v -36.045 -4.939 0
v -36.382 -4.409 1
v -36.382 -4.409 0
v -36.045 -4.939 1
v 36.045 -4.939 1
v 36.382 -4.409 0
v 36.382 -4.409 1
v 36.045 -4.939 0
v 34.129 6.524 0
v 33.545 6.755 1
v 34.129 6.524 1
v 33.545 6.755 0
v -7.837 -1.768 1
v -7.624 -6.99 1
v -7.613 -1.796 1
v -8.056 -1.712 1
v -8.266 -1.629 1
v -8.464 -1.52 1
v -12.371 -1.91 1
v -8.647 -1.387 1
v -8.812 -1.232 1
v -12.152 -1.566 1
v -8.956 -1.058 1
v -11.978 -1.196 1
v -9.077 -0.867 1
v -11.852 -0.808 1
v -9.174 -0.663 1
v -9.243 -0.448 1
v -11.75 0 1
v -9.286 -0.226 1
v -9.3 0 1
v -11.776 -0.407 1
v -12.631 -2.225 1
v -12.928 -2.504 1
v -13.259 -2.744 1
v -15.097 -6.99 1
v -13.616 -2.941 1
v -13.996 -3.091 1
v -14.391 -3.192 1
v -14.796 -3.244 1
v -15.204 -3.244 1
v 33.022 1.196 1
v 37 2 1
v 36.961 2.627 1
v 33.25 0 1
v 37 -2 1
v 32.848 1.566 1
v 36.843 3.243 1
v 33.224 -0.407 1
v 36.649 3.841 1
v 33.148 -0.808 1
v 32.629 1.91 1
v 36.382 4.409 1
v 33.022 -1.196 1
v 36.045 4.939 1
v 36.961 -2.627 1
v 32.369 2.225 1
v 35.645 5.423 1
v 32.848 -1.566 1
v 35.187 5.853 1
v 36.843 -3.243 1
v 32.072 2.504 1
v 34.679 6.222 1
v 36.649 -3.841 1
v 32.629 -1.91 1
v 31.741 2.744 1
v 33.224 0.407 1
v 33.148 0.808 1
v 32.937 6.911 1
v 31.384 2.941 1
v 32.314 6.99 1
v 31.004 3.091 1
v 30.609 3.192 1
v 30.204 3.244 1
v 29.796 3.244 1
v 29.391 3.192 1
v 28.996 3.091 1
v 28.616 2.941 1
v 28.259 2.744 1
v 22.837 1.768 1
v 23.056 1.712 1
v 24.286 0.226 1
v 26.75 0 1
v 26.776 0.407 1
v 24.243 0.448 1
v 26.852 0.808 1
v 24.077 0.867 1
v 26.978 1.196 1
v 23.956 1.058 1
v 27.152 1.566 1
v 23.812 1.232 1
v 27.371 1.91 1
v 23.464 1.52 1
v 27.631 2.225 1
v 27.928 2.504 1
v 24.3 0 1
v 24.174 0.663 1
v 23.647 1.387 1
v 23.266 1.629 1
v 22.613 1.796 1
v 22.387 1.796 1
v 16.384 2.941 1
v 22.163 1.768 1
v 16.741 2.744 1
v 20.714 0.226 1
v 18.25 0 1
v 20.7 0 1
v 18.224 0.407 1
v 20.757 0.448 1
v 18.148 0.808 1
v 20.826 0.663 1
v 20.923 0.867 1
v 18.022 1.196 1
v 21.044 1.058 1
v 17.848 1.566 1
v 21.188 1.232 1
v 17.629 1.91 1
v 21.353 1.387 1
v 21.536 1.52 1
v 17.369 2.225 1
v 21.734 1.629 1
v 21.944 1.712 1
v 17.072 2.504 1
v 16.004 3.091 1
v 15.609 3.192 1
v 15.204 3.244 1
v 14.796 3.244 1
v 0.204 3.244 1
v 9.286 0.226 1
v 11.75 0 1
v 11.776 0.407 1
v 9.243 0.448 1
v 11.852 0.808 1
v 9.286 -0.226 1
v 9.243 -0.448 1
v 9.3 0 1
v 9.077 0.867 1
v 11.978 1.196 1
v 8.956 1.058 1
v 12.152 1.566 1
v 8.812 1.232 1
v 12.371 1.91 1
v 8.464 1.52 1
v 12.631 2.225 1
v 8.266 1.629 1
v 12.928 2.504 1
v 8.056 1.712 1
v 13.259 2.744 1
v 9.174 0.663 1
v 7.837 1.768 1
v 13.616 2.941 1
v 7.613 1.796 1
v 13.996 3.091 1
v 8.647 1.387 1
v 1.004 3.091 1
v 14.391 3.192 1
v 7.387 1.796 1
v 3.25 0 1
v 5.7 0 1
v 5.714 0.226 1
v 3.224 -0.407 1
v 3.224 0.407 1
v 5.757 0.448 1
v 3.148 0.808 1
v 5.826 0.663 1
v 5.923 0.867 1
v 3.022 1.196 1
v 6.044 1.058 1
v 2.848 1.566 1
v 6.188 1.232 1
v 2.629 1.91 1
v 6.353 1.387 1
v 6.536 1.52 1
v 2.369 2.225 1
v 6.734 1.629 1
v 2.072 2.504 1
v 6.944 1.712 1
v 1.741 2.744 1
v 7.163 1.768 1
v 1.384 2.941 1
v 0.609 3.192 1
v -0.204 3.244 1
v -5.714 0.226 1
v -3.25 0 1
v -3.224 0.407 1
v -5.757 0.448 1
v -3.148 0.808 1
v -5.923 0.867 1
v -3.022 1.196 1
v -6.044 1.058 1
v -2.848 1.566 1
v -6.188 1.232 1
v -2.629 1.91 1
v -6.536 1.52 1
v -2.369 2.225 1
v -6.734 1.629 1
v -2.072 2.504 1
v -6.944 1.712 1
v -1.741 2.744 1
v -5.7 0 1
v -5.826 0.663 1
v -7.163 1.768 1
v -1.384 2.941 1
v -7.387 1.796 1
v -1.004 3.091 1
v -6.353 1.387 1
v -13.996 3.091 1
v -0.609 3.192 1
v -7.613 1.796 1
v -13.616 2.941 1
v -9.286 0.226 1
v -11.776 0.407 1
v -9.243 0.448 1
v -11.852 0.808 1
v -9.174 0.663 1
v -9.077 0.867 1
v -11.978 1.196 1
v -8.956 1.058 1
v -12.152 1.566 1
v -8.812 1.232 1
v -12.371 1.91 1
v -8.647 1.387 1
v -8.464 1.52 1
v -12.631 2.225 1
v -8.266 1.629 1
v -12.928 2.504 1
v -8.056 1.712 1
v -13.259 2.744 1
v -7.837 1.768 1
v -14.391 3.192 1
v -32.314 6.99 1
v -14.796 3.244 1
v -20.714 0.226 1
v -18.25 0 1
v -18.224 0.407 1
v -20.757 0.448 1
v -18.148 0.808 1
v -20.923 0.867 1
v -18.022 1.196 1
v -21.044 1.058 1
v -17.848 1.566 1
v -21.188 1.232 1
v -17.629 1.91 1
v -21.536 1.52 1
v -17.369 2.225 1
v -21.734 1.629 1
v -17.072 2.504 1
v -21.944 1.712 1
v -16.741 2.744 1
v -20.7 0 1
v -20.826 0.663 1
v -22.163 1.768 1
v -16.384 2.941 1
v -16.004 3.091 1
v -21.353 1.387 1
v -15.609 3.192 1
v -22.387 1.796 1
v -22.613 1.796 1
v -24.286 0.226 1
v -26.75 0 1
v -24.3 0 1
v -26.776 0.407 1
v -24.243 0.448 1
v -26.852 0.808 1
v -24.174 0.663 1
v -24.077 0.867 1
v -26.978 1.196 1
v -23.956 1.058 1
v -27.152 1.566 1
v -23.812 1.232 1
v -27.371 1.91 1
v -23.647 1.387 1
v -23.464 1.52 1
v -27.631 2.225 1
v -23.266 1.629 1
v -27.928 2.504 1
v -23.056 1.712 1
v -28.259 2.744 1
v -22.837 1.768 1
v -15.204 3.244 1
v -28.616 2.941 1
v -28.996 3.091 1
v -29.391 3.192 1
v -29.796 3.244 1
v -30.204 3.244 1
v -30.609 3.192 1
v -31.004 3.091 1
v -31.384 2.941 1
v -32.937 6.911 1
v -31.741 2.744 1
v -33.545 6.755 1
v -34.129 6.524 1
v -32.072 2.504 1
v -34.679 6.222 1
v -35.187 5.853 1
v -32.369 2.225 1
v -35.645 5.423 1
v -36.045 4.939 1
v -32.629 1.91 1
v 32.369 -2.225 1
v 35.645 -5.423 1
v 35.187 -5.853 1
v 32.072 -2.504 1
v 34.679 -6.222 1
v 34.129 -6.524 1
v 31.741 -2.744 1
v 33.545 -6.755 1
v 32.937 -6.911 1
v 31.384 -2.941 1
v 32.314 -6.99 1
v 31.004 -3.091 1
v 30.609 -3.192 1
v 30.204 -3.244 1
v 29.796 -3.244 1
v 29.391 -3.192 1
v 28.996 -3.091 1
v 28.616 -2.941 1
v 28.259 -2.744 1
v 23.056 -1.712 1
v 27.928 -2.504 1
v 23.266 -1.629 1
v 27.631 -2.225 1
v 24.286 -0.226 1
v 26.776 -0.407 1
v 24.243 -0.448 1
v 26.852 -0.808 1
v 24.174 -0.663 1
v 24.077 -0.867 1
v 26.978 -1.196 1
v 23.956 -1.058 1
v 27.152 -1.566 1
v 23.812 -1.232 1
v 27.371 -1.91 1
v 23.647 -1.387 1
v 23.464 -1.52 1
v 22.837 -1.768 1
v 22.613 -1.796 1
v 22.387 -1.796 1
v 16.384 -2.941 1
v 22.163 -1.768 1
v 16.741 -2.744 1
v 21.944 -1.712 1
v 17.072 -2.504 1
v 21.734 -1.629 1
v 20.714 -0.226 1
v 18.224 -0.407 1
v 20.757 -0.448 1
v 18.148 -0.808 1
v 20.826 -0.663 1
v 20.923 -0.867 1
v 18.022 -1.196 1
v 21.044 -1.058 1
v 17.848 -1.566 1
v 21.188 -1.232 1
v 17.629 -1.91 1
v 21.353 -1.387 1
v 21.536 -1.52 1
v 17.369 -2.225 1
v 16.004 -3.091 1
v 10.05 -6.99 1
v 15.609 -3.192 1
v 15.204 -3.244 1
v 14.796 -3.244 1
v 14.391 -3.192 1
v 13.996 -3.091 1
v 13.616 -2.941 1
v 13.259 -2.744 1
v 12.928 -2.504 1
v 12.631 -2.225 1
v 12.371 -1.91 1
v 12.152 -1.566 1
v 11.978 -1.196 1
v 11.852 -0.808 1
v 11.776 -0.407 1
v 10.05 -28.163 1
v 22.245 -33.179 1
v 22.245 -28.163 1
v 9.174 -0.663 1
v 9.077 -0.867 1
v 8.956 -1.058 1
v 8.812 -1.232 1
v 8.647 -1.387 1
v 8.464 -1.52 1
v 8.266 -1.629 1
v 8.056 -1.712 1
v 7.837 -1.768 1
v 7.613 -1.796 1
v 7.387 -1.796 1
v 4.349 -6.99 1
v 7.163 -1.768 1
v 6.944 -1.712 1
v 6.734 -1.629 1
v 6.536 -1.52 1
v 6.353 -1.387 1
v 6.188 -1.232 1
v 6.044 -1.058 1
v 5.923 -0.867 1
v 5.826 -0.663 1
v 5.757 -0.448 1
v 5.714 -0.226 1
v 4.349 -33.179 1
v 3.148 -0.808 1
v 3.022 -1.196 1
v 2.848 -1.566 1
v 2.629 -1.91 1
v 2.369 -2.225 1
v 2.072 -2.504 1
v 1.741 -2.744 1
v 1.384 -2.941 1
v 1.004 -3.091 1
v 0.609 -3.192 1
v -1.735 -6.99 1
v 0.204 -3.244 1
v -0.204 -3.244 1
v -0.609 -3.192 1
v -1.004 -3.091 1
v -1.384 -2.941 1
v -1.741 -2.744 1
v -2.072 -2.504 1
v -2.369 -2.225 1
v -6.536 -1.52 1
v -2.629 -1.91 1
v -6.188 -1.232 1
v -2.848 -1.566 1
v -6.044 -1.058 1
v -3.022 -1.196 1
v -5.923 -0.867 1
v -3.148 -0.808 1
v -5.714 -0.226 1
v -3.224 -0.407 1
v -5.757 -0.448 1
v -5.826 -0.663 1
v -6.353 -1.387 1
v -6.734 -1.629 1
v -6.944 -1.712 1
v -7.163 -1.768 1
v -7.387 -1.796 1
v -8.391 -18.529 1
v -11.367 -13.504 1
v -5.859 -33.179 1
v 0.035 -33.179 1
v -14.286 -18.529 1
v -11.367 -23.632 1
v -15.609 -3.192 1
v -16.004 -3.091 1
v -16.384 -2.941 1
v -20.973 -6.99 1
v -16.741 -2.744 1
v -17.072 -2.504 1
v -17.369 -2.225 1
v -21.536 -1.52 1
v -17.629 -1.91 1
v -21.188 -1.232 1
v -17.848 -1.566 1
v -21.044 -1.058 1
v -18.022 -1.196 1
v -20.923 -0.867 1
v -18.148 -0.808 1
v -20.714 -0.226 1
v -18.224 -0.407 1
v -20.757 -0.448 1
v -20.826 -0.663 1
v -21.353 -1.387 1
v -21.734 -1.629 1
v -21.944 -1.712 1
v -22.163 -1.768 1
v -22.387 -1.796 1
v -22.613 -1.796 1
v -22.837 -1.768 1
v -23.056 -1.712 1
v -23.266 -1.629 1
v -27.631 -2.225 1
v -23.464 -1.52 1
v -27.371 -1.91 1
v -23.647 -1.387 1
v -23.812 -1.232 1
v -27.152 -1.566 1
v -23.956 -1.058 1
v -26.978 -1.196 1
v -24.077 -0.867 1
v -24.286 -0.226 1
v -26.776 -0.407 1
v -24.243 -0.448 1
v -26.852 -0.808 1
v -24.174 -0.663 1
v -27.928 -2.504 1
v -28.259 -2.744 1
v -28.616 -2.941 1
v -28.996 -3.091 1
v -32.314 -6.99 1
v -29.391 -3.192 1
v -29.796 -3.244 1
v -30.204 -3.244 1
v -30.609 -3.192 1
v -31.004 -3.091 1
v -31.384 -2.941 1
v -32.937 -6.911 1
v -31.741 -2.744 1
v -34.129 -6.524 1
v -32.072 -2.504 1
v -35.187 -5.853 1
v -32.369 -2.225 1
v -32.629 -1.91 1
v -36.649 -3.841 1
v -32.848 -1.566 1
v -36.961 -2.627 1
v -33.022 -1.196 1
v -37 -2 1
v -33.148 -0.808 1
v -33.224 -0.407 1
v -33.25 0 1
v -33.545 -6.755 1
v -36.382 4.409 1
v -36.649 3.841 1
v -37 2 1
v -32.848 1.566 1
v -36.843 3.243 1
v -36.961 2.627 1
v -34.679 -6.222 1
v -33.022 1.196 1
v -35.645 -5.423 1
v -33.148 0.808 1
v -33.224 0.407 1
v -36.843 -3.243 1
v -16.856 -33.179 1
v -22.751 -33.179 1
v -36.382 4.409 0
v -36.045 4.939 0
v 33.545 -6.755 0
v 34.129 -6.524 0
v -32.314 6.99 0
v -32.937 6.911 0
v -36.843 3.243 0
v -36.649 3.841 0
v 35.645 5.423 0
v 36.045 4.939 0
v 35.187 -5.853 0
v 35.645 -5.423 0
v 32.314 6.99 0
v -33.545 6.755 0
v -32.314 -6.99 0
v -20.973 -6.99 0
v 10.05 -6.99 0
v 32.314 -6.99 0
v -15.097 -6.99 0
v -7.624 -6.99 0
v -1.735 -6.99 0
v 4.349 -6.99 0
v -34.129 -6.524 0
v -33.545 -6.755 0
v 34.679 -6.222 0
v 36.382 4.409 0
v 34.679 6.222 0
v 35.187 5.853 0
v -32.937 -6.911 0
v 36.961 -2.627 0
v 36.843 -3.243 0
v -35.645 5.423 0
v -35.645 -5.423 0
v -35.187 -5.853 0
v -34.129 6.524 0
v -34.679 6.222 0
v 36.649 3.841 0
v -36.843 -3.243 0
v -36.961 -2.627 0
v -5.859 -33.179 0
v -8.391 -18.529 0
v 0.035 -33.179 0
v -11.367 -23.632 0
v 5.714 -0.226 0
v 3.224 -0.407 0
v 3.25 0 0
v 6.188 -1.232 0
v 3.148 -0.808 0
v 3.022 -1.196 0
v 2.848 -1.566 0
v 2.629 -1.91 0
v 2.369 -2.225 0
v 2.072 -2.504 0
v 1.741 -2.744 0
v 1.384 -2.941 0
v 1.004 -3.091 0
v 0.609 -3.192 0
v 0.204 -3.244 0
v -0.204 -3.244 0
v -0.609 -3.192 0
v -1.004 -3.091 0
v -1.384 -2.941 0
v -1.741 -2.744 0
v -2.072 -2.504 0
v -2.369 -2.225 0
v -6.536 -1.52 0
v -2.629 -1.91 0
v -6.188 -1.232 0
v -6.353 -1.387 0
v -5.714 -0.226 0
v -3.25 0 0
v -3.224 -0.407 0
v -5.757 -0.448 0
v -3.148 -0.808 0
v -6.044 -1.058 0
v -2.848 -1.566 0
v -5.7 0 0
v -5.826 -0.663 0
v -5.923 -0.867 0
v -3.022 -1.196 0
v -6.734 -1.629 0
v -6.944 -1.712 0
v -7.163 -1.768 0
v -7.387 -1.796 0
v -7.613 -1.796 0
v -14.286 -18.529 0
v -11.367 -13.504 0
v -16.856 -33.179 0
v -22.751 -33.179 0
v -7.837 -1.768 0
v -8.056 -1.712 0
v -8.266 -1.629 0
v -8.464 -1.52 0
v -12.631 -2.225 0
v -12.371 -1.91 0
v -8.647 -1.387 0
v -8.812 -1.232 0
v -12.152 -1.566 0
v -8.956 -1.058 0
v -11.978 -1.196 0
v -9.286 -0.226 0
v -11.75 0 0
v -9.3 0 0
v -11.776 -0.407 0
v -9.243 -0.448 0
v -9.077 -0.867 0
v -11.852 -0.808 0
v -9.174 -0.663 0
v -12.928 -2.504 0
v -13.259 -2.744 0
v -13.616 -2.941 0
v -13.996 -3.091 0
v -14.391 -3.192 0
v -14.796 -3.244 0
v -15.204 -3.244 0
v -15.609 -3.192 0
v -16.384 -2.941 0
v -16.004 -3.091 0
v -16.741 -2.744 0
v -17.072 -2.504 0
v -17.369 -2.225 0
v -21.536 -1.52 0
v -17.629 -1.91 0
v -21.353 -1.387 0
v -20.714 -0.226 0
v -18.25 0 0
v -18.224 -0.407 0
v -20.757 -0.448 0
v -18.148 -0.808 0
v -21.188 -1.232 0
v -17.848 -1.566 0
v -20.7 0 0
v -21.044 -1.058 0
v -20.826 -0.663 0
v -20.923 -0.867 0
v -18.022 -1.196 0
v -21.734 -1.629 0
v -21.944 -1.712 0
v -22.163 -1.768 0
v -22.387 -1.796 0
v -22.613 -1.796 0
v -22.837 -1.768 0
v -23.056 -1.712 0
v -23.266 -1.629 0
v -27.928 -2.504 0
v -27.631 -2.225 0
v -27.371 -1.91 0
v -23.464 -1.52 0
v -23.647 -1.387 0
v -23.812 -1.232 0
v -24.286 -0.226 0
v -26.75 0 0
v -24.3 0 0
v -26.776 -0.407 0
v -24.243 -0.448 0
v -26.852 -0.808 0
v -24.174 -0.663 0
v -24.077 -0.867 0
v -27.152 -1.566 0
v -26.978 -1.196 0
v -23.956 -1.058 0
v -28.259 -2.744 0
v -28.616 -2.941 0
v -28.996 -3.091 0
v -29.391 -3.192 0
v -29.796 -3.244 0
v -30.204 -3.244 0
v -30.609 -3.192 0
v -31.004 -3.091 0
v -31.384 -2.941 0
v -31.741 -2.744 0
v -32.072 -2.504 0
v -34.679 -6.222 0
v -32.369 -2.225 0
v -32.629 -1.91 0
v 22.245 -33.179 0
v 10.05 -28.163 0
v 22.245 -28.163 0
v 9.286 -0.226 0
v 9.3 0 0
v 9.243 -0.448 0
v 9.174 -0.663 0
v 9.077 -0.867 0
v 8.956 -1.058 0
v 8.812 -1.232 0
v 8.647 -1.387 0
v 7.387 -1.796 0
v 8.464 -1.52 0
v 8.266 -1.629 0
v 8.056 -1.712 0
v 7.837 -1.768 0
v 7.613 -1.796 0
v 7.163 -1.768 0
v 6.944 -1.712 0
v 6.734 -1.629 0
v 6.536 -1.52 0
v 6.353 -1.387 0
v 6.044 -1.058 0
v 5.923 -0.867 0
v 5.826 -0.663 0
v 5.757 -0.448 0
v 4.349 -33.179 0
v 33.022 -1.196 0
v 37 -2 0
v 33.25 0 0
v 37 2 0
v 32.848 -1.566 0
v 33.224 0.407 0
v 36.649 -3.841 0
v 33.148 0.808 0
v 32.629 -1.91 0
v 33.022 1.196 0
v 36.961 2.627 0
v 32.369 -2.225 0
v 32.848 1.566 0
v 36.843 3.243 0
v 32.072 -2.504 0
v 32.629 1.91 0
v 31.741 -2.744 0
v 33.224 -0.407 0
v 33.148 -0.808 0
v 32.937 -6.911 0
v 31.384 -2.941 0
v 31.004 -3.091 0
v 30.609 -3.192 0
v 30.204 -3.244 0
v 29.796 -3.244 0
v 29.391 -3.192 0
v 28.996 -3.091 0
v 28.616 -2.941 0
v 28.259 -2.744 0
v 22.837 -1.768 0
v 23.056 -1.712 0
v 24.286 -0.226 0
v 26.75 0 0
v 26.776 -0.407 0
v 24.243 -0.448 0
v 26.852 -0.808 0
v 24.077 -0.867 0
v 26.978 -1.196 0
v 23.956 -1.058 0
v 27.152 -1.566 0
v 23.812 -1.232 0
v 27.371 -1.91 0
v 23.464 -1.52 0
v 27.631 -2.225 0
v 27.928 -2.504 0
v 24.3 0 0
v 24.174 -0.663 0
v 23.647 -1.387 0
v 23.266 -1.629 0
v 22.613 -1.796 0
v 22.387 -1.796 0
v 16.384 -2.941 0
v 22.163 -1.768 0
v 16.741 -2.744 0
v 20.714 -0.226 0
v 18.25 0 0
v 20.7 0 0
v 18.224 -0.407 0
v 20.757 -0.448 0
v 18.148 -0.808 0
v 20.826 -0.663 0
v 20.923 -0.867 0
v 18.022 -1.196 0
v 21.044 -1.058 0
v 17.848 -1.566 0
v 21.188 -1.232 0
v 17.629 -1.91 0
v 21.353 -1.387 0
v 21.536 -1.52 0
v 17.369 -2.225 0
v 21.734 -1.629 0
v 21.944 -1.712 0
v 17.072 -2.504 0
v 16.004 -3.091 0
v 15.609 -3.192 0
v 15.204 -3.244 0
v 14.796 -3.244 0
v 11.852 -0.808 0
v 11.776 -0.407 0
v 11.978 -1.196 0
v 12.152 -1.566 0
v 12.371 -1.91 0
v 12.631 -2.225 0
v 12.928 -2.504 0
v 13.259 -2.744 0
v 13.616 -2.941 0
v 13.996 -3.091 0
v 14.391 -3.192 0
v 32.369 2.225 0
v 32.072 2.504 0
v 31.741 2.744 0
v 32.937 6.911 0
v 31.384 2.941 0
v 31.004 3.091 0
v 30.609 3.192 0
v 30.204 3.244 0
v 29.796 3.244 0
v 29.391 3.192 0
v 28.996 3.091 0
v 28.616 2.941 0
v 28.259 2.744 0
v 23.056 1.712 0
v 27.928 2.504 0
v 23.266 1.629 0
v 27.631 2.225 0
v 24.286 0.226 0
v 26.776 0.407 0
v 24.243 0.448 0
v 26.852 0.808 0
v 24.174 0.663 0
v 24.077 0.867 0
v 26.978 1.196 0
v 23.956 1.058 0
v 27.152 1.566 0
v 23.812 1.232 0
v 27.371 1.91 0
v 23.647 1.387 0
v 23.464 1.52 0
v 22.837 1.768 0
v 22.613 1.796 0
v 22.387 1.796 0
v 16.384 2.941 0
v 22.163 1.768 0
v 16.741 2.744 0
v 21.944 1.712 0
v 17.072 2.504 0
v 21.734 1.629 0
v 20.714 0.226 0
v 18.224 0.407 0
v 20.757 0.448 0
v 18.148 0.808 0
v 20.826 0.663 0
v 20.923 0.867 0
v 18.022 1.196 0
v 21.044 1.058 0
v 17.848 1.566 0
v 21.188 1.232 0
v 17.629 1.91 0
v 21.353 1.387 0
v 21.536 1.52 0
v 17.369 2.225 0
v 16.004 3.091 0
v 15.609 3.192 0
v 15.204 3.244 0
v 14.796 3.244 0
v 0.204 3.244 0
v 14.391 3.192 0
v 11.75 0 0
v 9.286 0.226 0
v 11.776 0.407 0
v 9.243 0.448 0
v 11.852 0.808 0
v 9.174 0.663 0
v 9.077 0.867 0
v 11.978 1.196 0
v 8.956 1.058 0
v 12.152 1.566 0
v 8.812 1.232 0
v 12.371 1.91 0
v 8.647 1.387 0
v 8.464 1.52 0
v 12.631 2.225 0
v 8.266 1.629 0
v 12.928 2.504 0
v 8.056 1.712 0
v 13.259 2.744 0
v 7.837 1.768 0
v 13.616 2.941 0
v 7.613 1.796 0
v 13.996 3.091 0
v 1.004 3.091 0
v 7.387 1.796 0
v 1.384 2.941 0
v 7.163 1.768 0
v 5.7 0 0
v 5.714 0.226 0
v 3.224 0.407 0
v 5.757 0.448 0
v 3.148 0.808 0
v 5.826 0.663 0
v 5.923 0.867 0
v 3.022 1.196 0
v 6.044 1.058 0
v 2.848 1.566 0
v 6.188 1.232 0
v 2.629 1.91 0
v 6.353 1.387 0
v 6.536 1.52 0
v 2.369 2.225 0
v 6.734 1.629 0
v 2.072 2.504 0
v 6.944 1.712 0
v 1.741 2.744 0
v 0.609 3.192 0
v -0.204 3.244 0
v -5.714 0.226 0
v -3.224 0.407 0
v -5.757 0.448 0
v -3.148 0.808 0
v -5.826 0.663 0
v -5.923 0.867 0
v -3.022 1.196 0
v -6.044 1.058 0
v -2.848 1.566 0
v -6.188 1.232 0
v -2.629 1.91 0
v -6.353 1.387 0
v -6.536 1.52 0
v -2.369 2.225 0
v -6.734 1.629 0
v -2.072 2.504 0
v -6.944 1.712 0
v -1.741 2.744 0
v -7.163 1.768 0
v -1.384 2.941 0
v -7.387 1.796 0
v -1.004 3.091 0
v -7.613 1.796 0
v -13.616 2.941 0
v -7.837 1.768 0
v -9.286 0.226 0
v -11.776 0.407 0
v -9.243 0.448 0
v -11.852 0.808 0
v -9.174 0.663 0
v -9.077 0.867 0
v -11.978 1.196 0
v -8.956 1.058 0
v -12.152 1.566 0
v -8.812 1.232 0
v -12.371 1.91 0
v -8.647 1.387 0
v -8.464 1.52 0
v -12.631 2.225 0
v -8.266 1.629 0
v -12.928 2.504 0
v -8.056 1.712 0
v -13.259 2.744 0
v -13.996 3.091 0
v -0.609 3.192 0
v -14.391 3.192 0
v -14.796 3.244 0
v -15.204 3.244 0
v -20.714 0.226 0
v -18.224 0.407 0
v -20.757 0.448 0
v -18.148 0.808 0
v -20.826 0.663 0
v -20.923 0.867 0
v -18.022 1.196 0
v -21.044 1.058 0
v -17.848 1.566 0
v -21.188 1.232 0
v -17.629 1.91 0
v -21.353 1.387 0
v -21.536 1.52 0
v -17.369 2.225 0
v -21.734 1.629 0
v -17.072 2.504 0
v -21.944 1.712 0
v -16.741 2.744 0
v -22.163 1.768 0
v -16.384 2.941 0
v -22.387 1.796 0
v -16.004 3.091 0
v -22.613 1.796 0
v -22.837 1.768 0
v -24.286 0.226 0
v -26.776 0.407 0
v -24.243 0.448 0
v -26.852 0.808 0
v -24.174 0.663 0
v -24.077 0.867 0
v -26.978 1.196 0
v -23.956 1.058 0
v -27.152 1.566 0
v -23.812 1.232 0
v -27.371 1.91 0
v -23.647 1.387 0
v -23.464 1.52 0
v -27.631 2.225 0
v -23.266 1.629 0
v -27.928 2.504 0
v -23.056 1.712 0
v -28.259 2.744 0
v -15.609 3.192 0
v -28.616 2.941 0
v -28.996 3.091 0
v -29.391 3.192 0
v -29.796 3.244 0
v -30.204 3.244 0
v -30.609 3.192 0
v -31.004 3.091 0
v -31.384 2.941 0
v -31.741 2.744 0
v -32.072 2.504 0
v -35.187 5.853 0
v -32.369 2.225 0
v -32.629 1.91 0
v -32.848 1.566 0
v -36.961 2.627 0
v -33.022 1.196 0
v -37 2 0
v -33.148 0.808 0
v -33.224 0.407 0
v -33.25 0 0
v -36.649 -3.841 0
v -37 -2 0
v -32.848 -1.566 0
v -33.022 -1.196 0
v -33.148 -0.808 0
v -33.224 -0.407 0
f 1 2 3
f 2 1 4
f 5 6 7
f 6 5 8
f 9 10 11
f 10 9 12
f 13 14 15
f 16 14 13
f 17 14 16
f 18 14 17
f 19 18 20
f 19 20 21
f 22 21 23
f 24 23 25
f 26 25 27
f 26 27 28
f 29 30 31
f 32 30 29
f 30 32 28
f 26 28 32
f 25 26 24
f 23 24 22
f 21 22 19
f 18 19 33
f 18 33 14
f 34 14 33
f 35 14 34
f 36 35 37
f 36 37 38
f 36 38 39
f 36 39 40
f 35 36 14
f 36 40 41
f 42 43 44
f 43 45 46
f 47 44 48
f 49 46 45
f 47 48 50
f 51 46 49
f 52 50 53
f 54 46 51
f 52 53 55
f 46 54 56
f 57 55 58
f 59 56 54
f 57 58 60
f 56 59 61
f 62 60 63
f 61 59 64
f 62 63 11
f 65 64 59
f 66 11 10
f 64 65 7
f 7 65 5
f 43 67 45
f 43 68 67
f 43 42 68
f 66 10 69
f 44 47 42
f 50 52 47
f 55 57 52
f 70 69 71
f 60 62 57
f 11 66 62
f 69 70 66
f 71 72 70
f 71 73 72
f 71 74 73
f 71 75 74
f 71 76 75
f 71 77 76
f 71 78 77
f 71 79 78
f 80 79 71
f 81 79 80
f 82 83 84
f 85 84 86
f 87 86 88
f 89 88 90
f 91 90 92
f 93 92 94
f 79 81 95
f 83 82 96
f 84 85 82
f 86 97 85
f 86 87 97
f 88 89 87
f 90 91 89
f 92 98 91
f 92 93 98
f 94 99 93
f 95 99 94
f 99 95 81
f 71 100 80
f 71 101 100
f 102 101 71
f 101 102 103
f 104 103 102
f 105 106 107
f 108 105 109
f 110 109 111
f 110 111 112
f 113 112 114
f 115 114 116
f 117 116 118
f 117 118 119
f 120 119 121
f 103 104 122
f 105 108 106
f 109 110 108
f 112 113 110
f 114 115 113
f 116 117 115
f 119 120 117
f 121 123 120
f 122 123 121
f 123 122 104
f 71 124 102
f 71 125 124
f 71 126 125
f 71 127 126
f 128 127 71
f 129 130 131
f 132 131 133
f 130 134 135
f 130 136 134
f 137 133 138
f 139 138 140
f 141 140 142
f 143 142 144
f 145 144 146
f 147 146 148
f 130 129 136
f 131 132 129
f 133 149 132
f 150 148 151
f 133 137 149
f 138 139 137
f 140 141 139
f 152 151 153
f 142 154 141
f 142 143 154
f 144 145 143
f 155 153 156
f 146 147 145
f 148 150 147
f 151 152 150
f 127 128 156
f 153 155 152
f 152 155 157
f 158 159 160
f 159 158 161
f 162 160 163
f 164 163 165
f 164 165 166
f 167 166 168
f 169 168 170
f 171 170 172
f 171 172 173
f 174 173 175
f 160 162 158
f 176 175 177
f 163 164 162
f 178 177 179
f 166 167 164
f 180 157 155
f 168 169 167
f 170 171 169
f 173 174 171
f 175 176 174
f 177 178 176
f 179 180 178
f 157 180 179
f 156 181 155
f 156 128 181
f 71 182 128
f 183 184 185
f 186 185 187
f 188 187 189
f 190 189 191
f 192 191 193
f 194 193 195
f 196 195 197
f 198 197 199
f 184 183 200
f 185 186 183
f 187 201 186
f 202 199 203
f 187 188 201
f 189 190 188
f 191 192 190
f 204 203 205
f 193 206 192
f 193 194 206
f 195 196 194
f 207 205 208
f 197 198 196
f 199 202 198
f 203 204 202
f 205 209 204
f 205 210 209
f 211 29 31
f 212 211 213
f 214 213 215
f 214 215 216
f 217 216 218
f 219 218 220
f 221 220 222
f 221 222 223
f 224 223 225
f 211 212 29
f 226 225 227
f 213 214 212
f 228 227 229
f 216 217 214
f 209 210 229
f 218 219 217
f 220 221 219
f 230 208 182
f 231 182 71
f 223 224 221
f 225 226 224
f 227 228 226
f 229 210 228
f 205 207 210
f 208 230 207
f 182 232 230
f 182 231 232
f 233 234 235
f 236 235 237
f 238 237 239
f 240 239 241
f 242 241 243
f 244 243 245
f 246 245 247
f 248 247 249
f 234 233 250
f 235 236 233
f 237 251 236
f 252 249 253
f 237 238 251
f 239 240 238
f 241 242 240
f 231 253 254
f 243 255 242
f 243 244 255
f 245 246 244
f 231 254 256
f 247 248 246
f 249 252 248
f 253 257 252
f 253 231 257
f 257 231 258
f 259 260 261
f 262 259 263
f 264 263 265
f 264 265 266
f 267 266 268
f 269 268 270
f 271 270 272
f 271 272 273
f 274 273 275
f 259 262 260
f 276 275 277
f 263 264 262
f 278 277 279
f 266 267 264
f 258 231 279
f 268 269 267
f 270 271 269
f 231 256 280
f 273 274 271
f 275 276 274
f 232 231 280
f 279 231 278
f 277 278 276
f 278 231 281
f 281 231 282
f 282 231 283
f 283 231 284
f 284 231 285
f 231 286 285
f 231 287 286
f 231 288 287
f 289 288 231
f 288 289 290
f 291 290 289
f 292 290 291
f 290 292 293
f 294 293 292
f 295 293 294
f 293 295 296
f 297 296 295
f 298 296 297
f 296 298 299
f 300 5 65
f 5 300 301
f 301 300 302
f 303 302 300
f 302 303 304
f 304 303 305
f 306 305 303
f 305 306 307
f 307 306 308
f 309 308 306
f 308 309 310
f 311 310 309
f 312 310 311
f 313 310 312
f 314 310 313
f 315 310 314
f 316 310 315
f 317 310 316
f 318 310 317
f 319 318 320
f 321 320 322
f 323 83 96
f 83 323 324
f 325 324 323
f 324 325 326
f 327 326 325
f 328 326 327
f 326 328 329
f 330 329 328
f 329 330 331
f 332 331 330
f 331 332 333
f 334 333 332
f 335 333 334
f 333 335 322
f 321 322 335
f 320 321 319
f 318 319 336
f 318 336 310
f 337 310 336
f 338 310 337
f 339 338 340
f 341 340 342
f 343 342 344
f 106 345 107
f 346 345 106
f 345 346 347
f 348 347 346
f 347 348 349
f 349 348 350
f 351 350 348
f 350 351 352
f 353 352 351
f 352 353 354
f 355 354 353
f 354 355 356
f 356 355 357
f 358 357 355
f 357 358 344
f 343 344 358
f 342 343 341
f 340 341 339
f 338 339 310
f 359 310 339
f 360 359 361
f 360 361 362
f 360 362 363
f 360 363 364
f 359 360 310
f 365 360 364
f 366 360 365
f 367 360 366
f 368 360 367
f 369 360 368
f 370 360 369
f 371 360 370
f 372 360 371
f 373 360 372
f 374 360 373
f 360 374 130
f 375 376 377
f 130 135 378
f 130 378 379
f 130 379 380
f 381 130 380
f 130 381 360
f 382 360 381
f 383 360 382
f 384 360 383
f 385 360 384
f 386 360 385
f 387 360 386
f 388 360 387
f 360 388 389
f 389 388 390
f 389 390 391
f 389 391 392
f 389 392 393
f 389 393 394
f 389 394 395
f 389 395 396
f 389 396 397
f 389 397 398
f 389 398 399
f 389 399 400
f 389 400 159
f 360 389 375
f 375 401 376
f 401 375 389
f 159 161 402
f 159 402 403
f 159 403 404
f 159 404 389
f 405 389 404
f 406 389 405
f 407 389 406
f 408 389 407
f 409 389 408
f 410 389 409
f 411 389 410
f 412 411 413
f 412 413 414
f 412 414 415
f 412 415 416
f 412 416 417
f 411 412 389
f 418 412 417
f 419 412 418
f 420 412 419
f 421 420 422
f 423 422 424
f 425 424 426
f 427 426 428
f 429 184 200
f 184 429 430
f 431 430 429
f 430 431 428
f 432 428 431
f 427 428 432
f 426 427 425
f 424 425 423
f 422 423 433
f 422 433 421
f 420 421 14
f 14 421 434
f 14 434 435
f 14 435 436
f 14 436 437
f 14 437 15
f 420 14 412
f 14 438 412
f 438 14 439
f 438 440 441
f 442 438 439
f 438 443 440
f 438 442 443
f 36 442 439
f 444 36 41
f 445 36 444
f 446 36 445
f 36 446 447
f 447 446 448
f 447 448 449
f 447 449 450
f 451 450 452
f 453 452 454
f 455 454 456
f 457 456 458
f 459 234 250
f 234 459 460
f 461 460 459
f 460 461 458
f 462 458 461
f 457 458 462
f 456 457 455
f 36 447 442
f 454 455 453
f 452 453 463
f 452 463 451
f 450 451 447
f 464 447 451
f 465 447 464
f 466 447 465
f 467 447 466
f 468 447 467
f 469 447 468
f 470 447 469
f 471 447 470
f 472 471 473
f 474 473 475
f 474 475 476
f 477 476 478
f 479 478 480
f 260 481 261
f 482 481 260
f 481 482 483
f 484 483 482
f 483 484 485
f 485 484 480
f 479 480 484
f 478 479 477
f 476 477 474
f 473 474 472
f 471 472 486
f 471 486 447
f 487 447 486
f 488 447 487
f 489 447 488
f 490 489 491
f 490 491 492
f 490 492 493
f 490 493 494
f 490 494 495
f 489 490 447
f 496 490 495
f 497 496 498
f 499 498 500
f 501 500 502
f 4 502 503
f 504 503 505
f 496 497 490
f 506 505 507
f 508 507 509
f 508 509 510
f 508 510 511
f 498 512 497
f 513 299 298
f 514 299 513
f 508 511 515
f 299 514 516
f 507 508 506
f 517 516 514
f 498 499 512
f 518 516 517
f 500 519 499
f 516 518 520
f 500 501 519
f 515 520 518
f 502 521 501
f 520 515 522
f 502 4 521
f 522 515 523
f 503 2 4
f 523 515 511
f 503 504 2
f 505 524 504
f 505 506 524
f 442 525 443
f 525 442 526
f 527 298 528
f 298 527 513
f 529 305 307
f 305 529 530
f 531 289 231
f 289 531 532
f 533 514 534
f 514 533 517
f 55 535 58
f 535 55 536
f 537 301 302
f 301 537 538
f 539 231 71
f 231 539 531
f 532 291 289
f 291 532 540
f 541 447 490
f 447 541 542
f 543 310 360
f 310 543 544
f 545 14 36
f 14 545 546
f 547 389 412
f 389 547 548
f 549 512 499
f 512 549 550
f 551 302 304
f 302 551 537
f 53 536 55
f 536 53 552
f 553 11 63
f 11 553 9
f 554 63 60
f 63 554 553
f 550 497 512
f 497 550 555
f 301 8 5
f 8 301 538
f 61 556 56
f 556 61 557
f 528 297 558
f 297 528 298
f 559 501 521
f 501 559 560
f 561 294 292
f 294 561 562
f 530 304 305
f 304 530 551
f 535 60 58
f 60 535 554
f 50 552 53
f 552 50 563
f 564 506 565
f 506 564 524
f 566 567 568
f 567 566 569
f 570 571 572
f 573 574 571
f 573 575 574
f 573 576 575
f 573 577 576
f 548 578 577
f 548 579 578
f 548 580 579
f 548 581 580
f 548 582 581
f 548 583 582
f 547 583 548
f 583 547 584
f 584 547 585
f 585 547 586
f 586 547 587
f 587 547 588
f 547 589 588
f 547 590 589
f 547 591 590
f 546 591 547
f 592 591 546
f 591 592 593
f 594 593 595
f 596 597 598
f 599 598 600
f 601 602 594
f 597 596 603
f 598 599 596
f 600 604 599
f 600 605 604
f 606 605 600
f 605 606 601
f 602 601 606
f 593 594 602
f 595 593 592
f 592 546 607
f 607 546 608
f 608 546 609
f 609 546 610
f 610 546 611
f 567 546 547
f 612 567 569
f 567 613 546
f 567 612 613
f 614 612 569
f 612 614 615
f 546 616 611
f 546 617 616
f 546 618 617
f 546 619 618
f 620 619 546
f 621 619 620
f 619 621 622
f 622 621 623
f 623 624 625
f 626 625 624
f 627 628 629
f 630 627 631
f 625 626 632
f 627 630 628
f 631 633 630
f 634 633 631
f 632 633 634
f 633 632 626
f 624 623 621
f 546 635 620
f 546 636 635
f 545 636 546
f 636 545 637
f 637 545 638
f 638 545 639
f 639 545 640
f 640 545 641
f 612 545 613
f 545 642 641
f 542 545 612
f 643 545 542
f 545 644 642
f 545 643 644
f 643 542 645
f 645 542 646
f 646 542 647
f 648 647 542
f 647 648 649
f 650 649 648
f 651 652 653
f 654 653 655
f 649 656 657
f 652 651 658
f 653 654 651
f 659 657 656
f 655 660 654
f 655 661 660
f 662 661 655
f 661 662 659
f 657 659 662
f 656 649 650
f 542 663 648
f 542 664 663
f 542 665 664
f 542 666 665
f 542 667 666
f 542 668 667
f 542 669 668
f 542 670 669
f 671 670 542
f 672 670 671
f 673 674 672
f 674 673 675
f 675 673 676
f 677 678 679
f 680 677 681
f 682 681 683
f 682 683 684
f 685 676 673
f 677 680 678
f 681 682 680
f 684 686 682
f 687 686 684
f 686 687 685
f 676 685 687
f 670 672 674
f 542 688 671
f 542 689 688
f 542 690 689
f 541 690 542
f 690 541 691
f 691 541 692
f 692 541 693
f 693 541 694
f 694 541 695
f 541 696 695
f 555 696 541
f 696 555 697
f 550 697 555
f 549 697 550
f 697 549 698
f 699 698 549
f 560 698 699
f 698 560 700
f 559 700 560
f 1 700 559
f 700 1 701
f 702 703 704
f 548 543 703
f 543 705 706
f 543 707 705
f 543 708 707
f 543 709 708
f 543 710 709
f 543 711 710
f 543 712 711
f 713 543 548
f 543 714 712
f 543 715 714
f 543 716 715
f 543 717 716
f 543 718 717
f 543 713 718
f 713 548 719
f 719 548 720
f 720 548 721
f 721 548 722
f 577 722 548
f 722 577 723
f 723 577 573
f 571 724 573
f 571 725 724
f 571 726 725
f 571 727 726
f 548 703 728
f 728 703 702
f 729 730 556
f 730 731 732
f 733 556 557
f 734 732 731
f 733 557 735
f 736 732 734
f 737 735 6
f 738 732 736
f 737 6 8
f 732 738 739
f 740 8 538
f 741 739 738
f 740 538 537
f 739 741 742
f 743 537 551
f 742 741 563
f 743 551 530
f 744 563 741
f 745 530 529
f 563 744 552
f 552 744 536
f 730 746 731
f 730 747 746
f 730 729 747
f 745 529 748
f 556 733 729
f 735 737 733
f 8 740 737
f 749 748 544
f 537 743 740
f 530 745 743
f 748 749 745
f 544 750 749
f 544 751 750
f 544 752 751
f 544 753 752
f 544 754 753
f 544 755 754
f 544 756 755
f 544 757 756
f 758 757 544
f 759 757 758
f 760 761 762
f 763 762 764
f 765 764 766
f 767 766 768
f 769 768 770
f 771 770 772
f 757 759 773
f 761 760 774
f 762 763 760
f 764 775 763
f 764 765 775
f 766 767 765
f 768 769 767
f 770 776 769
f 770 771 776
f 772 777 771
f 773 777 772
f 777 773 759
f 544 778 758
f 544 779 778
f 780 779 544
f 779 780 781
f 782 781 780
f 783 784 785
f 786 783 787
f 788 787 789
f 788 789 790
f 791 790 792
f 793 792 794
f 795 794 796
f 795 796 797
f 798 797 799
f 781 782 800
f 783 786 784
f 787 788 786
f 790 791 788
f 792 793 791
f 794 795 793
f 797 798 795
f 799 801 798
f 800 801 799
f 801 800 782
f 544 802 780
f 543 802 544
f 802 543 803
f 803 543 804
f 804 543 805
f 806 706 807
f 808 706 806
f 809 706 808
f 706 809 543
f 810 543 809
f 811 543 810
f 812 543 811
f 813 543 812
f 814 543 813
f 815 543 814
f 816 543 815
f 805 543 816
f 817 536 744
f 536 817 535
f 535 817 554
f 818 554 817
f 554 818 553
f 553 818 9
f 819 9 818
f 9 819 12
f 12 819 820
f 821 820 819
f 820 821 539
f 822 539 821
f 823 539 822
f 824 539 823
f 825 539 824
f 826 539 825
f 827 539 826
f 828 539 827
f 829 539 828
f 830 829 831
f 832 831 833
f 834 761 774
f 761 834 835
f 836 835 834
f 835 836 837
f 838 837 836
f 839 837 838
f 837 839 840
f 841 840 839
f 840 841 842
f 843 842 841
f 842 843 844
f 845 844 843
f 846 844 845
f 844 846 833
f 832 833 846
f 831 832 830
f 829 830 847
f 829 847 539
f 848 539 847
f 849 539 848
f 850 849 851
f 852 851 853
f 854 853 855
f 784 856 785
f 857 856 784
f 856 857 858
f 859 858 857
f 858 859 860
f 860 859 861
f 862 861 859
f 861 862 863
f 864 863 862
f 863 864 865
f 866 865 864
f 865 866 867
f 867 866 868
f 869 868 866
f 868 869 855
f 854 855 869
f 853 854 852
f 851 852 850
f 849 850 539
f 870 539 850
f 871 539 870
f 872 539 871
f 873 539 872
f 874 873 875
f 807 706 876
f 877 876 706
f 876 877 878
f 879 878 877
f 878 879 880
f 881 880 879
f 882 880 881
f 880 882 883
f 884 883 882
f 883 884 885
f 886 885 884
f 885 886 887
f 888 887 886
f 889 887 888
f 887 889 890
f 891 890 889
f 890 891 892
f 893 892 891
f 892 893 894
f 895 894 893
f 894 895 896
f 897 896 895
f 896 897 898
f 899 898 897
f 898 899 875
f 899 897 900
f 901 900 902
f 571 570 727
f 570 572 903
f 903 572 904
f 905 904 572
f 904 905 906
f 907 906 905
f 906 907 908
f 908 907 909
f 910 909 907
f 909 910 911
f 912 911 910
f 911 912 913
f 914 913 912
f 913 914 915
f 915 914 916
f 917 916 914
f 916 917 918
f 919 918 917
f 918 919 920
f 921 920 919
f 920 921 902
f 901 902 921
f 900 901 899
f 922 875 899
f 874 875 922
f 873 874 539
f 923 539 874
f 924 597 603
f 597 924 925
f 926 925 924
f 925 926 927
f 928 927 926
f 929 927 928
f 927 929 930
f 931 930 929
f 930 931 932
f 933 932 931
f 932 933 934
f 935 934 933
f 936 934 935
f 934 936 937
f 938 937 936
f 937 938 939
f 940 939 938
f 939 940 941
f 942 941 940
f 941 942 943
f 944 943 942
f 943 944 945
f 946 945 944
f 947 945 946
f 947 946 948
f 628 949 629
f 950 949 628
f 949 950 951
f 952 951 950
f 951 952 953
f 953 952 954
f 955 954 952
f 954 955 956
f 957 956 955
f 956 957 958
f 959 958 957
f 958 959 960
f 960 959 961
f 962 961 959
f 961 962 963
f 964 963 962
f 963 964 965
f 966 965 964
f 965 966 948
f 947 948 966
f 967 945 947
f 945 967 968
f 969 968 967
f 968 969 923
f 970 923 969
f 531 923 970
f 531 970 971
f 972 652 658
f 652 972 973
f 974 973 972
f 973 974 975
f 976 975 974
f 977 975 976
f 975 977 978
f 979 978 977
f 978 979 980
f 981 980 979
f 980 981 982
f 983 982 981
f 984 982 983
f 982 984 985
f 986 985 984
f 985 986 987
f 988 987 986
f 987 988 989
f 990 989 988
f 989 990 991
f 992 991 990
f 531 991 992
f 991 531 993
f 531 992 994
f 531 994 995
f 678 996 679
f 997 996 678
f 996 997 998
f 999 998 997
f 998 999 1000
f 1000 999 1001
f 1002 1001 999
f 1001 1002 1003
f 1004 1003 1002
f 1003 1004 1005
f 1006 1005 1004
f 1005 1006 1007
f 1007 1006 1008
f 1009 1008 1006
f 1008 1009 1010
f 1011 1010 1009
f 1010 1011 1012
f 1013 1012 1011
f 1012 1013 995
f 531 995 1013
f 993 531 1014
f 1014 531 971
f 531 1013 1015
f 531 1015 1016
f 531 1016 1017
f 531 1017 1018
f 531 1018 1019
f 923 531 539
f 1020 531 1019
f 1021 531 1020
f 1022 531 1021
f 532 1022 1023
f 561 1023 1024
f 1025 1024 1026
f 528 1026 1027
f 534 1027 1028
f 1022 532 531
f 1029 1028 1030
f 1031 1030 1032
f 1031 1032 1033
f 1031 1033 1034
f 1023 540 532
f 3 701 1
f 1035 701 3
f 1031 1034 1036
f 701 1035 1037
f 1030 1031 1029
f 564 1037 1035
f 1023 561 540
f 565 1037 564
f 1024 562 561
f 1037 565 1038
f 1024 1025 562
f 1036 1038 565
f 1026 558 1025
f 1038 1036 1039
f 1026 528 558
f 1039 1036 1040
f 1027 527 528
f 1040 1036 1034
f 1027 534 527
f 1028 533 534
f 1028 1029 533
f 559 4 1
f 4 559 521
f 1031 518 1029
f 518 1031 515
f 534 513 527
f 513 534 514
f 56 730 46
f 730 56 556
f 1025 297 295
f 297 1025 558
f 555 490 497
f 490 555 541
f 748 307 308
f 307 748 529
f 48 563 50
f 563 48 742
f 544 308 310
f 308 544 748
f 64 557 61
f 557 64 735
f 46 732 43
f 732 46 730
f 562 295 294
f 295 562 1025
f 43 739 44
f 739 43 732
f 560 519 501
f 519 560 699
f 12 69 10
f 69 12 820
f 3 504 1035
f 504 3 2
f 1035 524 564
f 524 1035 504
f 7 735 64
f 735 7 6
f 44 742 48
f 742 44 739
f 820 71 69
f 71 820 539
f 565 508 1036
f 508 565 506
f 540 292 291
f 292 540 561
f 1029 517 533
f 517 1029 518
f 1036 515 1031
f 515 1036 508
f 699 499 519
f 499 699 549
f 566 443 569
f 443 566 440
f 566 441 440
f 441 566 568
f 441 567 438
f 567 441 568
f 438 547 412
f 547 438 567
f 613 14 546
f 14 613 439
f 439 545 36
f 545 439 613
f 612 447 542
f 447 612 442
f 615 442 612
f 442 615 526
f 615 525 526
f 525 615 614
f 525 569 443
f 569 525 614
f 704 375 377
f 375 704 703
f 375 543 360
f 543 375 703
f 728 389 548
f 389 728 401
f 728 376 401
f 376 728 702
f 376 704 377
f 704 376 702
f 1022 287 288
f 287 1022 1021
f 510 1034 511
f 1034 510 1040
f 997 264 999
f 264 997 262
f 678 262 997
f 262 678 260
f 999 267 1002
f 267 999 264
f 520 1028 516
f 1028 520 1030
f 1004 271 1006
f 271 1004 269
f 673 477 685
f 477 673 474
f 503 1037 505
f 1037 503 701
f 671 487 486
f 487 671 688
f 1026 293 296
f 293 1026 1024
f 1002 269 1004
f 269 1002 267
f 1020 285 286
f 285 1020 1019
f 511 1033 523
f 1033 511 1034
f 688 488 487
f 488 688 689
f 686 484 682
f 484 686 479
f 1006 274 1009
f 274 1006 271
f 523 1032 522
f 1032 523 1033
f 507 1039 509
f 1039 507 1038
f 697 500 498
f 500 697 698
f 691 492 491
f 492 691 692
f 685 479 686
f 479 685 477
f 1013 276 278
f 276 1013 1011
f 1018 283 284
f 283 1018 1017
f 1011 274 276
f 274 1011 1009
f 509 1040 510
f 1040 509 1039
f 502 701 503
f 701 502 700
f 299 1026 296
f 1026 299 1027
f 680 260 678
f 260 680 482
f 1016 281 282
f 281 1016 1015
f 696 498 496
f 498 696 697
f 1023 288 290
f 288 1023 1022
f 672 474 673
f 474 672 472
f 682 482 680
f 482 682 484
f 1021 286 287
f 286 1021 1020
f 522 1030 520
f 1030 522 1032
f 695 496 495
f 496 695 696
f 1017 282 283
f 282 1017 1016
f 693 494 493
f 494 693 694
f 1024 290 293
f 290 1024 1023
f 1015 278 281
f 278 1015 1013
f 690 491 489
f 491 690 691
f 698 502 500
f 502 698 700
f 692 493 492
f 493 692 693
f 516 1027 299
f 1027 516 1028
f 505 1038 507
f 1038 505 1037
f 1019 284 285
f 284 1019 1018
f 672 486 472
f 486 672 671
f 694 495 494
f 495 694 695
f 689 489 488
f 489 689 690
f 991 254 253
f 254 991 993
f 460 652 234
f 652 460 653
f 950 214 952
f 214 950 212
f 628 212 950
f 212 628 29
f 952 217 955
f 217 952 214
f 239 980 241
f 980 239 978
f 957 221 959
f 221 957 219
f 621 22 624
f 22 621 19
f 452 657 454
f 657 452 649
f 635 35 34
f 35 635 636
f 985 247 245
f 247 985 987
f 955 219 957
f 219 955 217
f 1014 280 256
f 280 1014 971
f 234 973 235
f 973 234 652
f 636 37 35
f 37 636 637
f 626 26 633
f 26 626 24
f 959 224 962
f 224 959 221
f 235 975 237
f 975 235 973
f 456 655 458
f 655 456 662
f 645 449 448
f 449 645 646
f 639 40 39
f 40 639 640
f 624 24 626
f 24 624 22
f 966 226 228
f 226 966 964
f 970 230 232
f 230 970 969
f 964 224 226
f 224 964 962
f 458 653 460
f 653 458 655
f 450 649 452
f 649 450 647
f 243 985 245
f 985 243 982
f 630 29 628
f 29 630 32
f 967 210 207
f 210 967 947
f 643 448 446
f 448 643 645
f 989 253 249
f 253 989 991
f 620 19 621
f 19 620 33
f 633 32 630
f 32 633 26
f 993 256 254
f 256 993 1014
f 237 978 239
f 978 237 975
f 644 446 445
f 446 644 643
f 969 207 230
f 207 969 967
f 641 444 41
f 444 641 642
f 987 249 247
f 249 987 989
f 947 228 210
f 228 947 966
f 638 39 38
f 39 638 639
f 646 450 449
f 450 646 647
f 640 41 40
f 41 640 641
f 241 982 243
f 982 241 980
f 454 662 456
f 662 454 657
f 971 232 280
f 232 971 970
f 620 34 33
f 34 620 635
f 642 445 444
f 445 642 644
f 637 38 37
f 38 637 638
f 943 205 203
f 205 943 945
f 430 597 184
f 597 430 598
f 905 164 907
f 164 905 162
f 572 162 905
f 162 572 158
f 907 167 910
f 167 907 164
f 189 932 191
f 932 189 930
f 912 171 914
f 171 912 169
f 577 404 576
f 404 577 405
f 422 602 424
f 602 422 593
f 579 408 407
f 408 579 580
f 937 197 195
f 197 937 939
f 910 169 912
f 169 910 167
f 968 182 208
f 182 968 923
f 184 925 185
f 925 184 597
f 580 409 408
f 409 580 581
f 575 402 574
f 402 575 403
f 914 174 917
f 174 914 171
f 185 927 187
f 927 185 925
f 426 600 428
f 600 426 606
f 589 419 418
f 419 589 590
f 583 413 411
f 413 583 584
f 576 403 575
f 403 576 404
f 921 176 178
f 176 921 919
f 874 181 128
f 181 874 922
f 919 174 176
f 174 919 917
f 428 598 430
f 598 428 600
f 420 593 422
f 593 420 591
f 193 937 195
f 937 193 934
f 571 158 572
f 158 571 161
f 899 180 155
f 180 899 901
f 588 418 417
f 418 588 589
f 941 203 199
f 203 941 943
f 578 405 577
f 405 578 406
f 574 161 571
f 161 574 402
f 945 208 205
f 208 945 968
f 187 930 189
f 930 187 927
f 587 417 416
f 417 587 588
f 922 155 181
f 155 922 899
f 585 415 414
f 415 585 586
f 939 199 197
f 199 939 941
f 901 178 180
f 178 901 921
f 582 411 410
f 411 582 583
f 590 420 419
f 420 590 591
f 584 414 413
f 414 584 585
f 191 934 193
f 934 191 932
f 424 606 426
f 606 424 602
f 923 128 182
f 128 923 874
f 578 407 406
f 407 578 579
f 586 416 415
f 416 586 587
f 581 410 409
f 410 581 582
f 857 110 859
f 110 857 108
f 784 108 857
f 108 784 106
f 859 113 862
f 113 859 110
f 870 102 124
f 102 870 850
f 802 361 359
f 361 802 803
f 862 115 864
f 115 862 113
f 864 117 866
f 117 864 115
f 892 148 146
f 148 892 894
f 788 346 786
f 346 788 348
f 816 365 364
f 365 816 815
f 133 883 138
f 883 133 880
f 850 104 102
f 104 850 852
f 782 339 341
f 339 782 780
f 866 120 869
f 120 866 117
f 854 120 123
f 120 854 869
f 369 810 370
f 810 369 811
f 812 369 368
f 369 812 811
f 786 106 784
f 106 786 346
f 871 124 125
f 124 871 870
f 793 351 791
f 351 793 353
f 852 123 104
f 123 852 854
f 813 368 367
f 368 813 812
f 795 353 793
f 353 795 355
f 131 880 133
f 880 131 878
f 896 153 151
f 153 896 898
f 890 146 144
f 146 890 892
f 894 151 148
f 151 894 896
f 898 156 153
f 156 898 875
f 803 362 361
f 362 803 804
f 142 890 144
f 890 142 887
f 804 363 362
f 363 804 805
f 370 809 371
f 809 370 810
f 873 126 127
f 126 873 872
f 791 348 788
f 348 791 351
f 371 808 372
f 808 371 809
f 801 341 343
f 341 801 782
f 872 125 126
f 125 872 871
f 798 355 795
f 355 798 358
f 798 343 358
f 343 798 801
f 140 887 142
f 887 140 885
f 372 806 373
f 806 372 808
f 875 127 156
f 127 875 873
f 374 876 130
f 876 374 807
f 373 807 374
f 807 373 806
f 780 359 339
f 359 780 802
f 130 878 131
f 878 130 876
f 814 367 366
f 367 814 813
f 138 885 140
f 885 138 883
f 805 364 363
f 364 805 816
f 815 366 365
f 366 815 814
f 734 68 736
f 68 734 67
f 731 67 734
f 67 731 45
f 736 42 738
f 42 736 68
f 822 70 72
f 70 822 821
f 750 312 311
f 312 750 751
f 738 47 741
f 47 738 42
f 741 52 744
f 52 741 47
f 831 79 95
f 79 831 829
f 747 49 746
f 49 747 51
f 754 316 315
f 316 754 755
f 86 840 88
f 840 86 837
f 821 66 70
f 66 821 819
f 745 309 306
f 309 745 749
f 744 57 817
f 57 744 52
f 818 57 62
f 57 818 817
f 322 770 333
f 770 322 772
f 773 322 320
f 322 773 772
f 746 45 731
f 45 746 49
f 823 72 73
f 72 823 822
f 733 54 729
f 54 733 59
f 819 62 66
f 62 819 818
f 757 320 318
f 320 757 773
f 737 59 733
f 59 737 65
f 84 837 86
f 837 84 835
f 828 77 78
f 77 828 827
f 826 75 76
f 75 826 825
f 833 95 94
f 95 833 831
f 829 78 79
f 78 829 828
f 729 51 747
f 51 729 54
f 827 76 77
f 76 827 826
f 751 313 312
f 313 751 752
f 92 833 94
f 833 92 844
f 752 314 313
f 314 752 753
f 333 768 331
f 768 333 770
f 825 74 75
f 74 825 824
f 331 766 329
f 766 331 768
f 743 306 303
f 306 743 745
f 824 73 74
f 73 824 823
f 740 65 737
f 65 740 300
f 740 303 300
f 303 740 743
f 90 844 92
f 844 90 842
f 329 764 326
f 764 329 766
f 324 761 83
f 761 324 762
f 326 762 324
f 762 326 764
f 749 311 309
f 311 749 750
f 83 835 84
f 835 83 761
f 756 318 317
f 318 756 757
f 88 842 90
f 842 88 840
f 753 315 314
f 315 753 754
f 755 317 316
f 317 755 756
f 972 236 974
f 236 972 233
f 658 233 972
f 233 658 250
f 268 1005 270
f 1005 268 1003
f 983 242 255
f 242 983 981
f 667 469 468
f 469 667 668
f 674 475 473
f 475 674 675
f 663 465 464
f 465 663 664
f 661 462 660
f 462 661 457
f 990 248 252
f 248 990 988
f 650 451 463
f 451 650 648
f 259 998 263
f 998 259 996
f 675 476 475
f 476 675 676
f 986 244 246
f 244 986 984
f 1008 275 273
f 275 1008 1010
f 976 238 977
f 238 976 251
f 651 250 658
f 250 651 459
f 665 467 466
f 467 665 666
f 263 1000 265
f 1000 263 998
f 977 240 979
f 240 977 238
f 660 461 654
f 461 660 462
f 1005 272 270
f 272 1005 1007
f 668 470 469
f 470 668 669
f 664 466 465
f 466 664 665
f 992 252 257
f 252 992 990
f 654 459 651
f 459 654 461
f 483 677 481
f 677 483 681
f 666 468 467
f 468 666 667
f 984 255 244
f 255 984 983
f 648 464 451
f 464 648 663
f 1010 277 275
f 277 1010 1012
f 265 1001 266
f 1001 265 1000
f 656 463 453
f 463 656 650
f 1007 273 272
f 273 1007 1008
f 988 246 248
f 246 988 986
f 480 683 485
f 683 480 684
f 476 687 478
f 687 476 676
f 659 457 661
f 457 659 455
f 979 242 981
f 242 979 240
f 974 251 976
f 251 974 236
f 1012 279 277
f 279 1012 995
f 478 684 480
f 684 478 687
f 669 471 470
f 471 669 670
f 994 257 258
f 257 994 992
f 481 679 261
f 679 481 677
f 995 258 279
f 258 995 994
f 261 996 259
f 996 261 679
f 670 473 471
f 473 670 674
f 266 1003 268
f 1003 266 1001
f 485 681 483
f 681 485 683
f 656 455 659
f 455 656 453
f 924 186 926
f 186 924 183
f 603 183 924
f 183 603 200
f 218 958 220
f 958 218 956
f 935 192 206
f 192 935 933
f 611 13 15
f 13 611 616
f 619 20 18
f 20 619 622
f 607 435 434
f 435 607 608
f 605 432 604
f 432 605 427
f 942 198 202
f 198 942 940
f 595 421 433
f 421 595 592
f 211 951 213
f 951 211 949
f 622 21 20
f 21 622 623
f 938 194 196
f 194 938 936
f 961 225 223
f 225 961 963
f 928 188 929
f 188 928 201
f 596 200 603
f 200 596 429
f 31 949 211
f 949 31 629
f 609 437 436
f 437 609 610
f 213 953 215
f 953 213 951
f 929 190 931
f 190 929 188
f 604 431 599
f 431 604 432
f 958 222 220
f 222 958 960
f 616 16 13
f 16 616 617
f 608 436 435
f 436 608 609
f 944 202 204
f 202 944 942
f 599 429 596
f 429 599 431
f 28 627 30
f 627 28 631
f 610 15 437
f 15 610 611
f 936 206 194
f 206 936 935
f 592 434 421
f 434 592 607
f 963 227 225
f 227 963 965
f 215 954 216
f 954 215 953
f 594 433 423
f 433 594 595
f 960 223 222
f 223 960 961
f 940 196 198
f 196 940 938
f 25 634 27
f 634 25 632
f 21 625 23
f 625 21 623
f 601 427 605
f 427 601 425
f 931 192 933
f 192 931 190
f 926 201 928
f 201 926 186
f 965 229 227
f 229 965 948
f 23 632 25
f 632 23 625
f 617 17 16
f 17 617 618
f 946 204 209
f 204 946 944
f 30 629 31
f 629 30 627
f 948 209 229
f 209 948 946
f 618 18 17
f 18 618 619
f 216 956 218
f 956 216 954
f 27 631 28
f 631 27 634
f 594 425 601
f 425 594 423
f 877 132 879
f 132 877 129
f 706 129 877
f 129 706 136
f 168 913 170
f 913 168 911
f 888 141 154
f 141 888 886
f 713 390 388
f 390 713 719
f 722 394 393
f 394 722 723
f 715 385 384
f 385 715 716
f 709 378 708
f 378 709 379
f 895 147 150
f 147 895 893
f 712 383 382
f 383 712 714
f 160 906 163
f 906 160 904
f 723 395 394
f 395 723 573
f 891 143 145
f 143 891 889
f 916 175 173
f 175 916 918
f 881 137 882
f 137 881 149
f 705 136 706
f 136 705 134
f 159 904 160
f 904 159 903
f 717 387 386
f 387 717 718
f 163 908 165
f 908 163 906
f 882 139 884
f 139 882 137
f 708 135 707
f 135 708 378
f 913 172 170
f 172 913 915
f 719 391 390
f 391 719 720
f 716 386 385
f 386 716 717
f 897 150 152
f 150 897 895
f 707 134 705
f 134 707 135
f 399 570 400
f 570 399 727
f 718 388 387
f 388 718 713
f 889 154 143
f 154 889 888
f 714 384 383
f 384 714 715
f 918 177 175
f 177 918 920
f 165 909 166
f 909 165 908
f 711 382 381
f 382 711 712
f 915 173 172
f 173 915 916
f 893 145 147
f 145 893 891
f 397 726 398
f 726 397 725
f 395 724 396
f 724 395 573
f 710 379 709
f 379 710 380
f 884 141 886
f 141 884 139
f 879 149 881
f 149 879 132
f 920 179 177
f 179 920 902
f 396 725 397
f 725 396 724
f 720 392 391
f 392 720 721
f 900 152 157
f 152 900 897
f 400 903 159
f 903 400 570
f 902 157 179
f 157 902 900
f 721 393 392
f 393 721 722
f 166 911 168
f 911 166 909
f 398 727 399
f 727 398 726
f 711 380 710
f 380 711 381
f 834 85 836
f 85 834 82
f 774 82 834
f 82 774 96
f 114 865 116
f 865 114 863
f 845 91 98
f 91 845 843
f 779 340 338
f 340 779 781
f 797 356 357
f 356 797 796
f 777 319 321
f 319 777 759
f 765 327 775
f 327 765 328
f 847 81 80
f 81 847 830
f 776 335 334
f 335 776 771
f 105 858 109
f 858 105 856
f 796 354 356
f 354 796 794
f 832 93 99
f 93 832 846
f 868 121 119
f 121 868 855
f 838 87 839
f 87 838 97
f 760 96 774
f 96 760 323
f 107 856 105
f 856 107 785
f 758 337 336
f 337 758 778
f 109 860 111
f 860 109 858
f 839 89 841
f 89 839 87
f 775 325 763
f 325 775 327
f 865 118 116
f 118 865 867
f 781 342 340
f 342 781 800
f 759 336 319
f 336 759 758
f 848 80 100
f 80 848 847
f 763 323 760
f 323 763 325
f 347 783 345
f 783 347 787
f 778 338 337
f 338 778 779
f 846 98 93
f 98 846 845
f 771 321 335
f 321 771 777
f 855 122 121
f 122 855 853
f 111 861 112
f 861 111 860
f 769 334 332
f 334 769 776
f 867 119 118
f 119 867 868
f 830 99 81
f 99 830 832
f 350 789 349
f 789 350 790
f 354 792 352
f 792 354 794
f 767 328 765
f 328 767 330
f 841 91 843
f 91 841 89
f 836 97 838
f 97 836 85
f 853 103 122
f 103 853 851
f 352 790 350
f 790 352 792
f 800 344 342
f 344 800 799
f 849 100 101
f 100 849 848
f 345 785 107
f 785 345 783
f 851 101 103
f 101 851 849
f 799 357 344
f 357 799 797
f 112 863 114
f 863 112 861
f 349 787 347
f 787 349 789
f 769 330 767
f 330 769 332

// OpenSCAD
$fn = 50;


difference() {
	union() {
		hull() {
			translate(v = [-32.0000000000, 2.0000000000, 0]) {
				cylinder(h = 1, r = 5);
			}
			translate(v = [32.0000000000, 2.0000000000, 0]) {
				cylinder(h = 1, r = 5);
			}
			translate(v = [-32.0000000000, -2.0000000000, 0]) {
				cylinder(h = 1, r = 5);
			}
			translate(v = [32.0000000000, -2.0000000000, 0]) {
				cylinder(h = 1, r = 5);
			}
		}
		translate(v = [0, -5, 0]) {
			linear_extrude(height = 1) {
				text(font = "DejaVu Sans Mono:style=Bold", halign = "center", size = 28.5000000000, text = "XL", valign = "top");
			}
		}
	}
	union() {
		translate(v = [-30.0000000000, 0.0000000000, 0]) {
			translate(v = [0, 0, -100]) {
				cylinder(h = 200, r = 3.2500000000);
			}
		}
		translate(v = [-15.0000000000, 0.0000000000, 0]) {
			translate(v = [0, 0, -100]) {
				cylinder(h = 200, r = 3.2500000000);
			}
		}
		translate(v = [0, 0, -100]) {
			cylinder(h = 200, r = 3.2500000000);
		}
		translate(v = [15.0000000000, 0.0000000000, 0]) {
			translate(v = [0, 0, -100]) {
				cylinder(h = 200, r = 3.2500000000);
			}
		}
		translate(v = [30.0000000000, 0.0000000000, 0]) {
			translate(v = [0, 0, -100]) {
				cylinder(h = 200, r = 3.2500000000);
			}
		}
		translate(v = [-30.0000000000, 0.0000000000, 0]) {
			translate(v = [0, 0, -100]) {
				cylinder(h = 200, r = 1.8000000000);
			}
		}
		translate(v = [-22.5000000000, 0.0000000000, 0]) {
			translate(v = [0, 0, -100]) {
				cylinder(h = 200, r = 1.8000000000);
			}
		}
		translate(v = [-15.0000000000, 0.0000000000, 0]) {
			translate(v = [0, 0, -100]) {
				cylinder(h = 200, r = 1.8000000000);
			}
		}
		translate(v = [-7.5000000000, 0.0000000000, 0]) {
			translate(v = [0, 0, -100]) {
				cylinder(h = 200, r = 1.8000000000);
			}
		}
		translate(v = [0, 0, -100]) {
			cylinder(h = 200, r = 1.8000000000);
		}
		translate(v = [7.5000000000, 0.0000000000, 0]) {
			translate(v = [0, 0, -100]) {
				cylinder(h = 200, r = 1.8000000000);
			}
		}
		translate(v = [15.0000000000, 0.0000000000, 0]) {
			translate(v = [0, 0, -100]) {
				cylinder(h = 200, r = 1.8000000000);
			}
		}
		translate(v = [22.5000000000, 0.0000000000, 0]) {
			translate(v = [0, 0, -100]) {
				cylinder(h = 200, r = 1.8000000000);
			}
		}
		translate(v = [30.0000000000, 0.0000000000, 0]) {
			translate(v = [0, 0, -100]) {
				cylinder(h = 200, r = 1.8000000000);
			}
		}
	}
}
